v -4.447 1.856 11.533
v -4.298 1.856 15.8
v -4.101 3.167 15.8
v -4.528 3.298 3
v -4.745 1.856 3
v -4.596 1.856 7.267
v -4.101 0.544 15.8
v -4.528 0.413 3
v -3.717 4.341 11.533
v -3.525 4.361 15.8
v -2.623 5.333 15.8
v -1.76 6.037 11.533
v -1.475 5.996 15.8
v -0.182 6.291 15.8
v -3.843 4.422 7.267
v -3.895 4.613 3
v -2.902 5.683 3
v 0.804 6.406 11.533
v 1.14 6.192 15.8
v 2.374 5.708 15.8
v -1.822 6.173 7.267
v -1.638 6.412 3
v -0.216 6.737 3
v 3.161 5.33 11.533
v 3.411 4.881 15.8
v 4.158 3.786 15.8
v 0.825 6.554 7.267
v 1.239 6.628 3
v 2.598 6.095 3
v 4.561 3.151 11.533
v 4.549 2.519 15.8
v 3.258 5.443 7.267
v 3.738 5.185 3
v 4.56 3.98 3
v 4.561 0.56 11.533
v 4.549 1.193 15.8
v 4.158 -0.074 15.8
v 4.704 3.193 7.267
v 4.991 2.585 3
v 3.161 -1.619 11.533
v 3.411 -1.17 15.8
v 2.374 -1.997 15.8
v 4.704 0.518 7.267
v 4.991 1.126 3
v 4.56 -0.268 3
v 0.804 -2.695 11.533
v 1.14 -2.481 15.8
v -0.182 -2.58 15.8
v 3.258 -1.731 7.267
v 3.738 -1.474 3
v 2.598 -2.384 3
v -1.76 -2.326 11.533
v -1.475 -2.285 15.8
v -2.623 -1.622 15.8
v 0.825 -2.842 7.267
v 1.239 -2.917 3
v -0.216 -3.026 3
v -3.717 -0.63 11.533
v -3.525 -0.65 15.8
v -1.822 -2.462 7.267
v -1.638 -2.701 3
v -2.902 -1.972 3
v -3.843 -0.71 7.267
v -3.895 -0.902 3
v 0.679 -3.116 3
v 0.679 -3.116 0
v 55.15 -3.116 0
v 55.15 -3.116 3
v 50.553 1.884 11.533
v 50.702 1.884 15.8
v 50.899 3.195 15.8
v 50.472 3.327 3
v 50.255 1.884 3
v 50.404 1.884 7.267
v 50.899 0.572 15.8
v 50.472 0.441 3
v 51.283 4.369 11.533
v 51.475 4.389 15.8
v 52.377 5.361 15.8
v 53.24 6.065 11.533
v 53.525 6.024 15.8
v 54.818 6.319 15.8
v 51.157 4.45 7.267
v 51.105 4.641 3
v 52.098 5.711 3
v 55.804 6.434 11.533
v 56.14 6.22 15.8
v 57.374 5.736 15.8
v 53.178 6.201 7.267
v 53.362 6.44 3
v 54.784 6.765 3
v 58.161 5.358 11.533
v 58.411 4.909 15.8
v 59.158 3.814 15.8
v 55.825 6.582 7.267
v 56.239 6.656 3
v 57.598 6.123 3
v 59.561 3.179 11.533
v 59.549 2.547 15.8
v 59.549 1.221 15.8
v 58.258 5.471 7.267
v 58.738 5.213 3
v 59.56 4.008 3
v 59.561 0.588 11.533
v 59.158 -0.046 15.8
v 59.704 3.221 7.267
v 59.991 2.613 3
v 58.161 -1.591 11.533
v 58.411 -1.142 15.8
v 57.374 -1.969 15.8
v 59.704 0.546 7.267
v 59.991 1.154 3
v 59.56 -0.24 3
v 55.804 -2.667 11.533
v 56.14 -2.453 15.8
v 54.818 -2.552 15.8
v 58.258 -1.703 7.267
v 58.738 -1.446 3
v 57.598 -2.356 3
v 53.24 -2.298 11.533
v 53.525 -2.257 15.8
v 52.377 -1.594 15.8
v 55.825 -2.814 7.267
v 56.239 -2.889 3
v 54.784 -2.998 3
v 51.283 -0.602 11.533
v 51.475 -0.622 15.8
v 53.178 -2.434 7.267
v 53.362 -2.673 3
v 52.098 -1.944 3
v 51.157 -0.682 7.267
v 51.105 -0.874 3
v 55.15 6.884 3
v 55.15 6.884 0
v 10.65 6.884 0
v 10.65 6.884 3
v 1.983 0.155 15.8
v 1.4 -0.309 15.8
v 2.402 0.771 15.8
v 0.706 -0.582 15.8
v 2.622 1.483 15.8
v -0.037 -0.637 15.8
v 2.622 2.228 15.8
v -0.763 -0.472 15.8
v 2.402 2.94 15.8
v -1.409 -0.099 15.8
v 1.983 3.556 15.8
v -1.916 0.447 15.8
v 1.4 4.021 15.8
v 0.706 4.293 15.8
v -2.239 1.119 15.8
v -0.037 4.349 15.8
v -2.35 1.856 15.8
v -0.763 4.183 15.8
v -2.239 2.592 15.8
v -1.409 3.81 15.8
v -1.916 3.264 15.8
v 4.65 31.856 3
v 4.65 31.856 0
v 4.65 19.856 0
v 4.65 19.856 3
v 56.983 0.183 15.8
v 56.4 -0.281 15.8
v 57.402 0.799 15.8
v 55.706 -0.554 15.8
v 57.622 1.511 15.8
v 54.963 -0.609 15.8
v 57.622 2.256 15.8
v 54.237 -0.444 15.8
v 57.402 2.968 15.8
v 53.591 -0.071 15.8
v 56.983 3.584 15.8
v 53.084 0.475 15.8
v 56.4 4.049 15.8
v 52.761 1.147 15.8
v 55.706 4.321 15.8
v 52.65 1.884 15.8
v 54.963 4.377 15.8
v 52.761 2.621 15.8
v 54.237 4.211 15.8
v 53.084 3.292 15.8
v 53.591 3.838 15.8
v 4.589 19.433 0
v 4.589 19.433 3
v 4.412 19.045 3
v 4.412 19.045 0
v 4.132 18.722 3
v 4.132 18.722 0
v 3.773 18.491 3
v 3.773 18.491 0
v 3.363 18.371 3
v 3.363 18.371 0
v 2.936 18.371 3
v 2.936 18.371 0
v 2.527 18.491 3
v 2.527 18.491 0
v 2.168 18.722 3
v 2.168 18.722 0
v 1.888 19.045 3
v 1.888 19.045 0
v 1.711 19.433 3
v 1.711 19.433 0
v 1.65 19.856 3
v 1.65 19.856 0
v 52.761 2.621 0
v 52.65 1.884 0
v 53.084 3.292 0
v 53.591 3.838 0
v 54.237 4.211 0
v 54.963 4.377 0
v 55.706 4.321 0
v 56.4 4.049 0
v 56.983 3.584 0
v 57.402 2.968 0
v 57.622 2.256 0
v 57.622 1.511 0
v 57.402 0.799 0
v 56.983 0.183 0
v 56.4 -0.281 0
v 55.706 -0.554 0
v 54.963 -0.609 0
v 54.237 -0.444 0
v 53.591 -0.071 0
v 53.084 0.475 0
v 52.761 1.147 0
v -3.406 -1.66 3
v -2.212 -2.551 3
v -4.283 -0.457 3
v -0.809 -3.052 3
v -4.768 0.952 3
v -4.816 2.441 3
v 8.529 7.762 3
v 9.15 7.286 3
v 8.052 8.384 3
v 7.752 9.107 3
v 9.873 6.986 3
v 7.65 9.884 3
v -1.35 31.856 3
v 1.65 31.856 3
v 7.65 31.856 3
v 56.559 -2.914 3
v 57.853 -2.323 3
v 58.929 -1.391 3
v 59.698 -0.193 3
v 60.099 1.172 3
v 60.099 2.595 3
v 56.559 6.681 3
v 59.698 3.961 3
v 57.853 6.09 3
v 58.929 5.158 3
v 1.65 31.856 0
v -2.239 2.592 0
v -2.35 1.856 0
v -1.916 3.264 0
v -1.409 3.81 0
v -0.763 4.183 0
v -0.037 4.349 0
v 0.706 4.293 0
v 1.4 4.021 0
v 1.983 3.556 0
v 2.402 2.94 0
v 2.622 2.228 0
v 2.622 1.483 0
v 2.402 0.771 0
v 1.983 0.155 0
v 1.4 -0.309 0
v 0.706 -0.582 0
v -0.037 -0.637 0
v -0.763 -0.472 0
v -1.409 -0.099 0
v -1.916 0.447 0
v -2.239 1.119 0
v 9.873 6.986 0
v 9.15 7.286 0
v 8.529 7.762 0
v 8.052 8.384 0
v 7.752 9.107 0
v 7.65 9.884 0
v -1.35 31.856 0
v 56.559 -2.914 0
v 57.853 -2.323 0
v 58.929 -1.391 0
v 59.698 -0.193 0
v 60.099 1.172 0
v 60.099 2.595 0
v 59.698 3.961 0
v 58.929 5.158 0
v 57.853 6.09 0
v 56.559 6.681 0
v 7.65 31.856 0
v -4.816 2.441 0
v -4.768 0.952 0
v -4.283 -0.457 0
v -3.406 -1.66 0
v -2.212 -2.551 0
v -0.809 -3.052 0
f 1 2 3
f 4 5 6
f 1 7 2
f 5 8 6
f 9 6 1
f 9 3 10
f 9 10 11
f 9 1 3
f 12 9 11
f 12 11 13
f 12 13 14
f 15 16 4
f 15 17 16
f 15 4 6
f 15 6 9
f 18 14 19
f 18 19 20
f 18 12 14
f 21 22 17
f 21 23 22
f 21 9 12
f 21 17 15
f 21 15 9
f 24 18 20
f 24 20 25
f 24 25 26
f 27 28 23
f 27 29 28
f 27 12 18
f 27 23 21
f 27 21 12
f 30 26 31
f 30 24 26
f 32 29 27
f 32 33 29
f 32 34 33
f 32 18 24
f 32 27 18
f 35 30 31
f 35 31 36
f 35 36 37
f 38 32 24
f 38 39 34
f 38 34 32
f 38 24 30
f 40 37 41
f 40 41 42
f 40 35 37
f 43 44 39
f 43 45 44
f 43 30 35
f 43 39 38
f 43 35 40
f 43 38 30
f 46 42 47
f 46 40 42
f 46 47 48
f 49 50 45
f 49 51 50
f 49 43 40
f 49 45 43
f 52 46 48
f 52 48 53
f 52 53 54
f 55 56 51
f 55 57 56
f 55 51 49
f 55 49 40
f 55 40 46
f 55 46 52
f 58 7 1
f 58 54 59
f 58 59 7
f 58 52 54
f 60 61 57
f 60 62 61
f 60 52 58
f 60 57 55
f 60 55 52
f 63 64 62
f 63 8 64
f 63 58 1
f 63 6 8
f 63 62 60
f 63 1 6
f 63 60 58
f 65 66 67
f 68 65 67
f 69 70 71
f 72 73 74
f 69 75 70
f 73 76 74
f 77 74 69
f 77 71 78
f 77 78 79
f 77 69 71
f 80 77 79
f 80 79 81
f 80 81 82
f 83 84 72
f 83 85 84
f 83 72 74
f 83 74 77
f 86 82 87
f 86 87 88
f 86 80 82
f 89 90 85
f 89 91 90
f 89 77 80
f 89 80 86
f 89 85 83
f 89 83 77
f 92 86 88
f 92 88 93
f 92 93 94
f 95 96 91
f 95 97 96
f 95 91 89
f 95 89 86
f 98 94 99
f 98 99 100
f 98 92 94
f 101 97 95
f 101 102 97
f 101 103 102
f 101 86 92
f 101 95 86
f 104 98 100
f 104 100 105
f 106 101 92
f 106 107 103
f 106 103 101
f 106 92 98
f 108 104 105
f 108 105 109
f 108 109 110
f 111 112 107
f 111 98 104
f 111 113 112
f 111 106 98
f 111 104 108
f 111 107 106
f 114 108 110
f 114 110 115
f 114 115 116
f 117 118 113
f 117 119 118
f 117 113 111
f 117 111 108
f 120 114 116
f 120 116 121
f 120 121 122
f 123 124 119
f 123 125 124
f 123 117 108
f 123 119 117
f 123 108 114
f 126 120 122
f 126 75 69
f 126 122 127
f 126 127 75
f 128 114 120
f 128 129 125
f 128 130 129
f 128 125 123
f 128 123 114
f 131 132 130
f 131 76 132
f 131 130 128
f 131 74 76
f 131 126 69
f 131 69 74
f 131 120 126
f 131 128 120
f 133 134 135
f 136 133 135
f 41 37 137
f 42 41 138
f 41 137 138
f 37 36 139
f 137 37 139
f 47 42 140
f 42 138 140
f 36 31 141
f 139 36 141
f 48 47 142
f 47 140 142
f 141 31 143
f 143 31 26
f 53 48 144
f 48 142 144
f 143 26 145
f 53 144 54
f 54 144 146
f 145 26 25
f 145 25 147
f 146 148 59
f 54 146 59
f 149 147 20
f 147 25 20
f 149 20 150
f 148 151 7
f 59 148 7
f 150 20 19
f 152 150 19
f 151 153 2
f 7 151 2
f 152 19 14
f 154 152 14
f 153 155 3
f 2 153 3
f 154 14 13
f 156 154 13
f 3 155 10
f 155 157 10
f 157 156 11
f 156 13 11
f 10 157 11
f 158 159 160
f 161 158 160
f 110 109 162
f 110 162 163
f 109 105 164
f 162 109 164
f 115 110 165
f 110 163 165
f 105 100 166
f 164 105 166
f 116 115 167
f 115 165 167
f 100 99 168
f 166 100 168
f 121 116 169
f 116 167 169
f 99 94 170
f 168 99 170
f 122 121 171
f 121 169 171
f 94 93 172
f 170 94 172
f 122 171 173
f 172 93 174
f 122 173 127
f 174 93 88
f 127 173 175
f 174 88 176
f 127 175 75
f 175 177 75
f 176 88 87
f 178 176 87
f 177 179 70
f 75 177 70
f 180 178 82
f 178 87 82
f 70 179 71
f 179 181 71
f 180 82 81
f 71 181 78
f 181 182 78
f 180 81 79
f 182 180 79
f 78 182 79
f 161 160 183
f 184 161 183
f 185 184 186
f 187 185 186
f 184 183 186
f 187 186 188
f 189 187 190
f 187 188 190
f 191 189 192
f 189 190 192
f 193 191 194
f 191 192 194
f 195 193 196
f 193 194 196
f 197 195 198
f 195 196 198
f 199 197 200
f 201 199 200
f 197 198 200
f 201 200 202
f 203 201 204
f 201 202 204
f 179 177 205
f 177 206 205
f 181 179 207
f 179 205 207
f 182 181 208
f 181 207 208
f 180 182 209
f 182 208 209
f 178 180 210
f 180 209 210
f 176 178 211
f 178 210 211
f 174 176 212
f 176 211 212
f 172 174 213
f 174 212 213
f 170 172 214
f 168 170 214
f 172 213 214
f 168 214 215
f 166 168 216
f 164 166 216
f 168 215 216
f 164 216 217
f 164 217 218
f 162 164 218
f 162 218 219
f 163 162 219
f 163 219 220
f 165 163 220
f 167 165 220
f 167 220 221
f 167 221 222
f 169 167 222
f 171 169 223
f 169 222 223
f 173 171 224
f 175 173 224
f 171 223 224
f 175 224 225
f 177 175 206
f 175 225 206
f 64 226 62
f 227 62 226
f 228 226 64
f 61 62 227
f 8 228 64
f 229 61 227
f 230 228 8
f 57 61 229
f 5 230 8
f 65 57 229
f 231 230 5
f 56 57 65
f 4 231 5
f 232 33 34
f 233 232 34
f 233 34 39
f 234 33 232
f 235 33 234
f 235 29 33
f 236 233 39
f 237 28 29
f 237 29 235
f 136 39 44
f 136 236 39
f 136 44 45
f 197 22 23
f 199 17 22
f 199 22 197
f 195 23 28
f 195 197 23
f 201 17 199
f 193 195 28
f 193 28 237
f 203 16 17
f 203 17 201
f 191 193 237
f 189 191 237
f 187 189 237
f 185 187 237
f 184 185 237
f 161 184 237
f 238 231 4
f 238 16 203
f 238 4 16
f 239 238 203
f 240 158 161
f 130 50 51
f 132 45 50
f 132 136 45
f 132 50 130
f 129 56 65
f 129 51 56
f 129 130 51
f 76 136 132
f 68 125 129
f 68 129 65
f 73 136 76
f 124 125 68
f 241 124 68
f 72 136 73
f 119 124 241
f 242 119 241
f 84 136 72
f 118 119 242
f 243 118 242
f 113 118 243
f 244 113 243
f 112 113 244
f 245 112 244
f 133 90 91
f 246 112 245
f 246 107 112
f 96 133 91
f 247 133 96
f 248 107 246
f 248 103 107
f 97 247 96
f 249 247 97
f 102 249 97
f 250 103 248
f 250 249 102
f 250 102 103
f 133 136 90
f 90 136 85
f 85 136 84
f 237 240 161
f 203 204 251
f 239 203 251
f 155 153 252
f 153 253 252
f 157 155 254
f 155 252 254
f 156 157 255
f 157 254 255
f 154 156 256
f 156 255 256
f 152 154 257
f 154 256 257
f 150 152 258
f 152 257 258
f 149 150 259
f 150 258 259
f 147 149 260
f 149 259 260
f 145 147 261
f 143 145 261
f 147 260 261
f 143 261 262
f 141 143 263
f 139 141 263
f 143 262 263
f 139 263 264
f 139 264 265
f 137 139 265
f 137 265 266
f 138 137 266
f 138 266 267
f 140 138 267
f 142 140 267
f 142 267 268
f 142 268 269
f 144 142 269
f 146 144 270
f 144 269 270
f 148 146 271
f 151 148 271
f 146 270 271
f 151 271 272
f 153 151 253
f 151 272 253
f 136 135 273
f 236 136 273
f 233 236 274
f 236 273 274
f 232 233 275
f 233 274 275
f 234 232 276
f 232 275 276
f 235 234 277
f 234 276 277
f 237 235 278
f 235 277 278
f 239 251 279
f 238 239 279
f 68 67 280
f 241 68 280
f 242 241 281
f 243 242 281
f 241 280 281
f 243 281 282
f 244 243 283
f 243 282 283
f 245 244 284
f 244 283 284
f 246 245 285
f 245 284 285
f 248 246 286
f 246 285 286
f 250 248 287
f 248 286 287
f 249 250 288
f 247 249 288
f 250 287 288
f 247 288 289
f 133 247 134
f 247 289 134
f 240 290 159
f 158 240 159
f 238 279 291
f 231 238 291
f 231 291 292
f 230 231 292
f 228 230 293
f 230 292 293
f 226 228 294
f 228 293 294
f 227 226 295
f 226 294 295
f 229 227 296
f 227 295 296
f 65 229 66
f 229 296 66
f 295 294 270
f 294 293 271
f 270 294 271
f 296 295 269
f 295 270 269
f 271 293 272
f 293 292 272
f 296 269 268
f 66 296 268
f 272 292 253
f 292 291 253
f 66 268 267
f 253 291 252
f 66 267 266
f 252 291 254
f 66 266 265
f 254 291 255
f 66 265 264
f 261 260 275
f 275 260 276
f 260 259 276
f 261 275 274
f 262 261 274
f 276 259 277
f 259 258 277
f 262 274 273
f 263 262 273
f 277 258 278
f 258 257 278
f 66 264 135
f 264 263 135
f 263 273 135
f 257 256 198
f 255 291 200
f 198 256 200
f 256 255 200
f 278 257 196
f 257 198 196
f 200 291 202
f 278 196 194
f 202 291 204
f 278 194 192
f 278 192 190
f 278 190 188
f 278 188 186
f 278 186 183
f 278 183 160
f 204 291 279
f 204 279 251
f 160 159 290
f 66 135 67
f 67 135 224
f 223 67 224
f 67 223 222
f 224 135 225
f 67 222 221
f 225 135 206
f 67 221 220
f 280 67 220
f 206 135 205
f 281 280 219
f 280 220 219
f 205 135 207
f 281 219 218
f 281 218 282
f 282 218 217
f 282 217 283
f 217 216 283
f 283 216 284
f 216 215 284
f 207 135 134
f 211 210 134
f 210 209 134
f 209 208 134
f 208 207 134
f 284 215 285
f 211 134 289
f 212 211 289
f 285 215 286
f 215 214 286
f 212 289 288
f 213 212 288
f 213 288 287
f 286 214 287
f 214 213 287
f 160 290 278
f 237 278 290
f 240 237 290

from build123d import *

# Parameters (mm, degrees)
BASE_EXTRUSION_DEPTH         = 3
ESQUISSE3_R                  = 4.999999999999999
BOSS_EXTRU_1_DEPTH           = 15.8
BOSS_EXTRU_1_DRAFT           = -2.0000000000000044
ESQUISSE3_R_2                = 4.9999999999999964
BOSS_EXTRU_1_PROFILE_2_DEPTH = 15.8
BOSS_EXTRU_1_PROFILE_2_DRAFT = -2.0000000000000044
PER_AGE1_D                   = 5
PER_AGE1_DEPTH               = 15.8
PER_AGE1_TIP                 = 1.5021515475689007
PER_AGE3_D                   = 5
PER_AGE3_DEPTH               = 15.8
PER_AGE3_TIP                 = 1.5021515475689007


with BuildPart() as part:
    # Esquisse1 → Base-Extrusion (new body)
    with BuildSketch(Plane.XY):
        with BuildLine():
            Line((0.6787939241914508, -3.1163780736354636), (55.149951438834705, -3.116378073635477))
            ThreePointArc((55.149951438834705, -3.116378073635477), (60.149951438834705, 1.883621926364523), (55.149951438834705, 6.883621926364523))
            Line((55.149951438834705, 6.883621926364523), (10.649951438834709, 6.883621926364541))
            ThreePointArc((10.649951438834709, 6.883621926364541), (8.528631095275069, 7.7623015828049), (7.649951438834709, 9.88362192636454))
            Line((7.649951438834709, 9.88362192636454), (7.649951438834716, 31.855575830583856))
            Line((7.649951438834716, 31.855575830583856), (4.649951438834716, 31.855575830583856))
            Line((4.649951438834716, 31.855575830583856), (4.649951438834713, 19.855575830583852))
            ThreePointArc((4.649951438834713, 19.855575830583852), (3.149951438834714, 18.355575830583852), (1.6499514388347154, 19.855575830583852))
            Line((1.6499514388347154, 19.855575830583852), (1.6499514388347158, 31.85557583058385))
            Line((1.6499514388347158, 31.85557583058385), (-1.350048561165284, 31.855575830583856))
            Line((-1.350048561165284, 31.855575830583856), (-4.815702167023938, 2.440626483624255))
            ThreePointArc((-4.815702167023938, 2.440626483624255), (-3.4055229517499925, -1.6599044862286791), (0.6787939241914508, -3.1163780736354636))
        make_face()
    extrude(amount=BASE_EXTRUSION_DEPTH)


with BuildPart() as boss_extru_1_tool:
    # Esquisse3 → Boss.-Extru.1 (with draft: the straight prism first)
    with BuildSketch(Plane(origin=(0, 0, 0), x_dir=(-1, 0, 0), z_dir=(0, 0, -1))):
        with Locations((-0.1499514388347119, 1.8555758305838532)):
            Circle(ESQUISSE3_R)
    extrude(amount=-BOSS_EXTRU_1_DEPTH)
    # Boss.-Extru.1: the draft: its side faces are tilted about the plane it starts from
    boss_extru_1_sides = [boss_extru_1_tool.faces().sort_by_distance(p)[0] for p in [
        (5.149951439, 1.855575831, 7.9),
    ]]
    draft(boss_extru_1_sides, Plane(origin=(0, 0, 0), x_dir=(-1, 0, 0), z_dir=(0, 0, -1)), BOSS_EXTRU_1_DRAFT)


with BuildPart() as part_1:
    add(part.part)

    # Boss.-Extru.1: add boss_extru_1_tool
    add(boss_extru_1_tool.part)


with BuildPart() as boss_extru_1_profile_2_tool:
    # Esquisse3 → Boss.-Extru.1 profile 2 (with draft: the straight prism first)
    with BuildSketch(Plane(origin=(0, 0, 0), x_dir=(-1, 0, 0), z_dir=(0, 0, -1))):
        with Locations((-55.149951438834705, 1.883621926364523)):
            Circle(ESQUISSE3_R_2)
    extrude(amount=-BOSS_EXTRU_1_PROFILE_2_DEPTH)
    # Boss.-Extru.1 profile 2: the draft: its side faces are tilted about the plane it starts from
    boss_extru_1_profile_2_sides = [boss_extru_1_profile_2_tool.faces().sort_by_distance(p)[0] for p in [
        (60.149951439, 1.883621926, 7.9),
    ]]
    draft(boss_extru_1_profile_2_sides, Plane(origin=(0, 0, 0), x_dir=(-1, 0, 0), z_dir=(0, 0, -1)), BOSS_EXTRU_1_PROFILE_2_DRAFT)


with BuildPart() as part_2:
    add(part_1.part)

    # Boss.-Extru.1 profile 2: add boss_extru_1_profile_2_tool
    add(boss_extru_1_profile_2_tool.part)

    # Perçage1
    with Locations(Plane.XY.offset(15.8)):
        with Locations((55.149951439, 1.883621926)):
            Hole(PER_AGE1_D / 2, depth=PER_AGE1_DEPTH)
            with Locations((0, 0, -(PER_AGE1_DEPTH + PER_AGE1_TIP / 2))):  # 118° drill point
                Cone(0, PER_AGE1_D / 2, PER_AGE1_TIP, mode=Mode.SUBTRACT)

    # Perçage3
    with Locations(Plane.XY.offset(15.8)):
        with Locations((0.149951439, 1.855575831)):
            Hole(PER_AGE3_D / 2, depth=PER_AGE3_DEPTH)
            with Locations((0, 0, -(PER_AGE3_DEPTH + PER_AGE3_TIP / 2))):  # 118° drill point
                Cone(0, PER_AGE3_D / 2, PER_AGE3_TIP, mode=Mode.SUBTRACT)


solid = part_2.part
